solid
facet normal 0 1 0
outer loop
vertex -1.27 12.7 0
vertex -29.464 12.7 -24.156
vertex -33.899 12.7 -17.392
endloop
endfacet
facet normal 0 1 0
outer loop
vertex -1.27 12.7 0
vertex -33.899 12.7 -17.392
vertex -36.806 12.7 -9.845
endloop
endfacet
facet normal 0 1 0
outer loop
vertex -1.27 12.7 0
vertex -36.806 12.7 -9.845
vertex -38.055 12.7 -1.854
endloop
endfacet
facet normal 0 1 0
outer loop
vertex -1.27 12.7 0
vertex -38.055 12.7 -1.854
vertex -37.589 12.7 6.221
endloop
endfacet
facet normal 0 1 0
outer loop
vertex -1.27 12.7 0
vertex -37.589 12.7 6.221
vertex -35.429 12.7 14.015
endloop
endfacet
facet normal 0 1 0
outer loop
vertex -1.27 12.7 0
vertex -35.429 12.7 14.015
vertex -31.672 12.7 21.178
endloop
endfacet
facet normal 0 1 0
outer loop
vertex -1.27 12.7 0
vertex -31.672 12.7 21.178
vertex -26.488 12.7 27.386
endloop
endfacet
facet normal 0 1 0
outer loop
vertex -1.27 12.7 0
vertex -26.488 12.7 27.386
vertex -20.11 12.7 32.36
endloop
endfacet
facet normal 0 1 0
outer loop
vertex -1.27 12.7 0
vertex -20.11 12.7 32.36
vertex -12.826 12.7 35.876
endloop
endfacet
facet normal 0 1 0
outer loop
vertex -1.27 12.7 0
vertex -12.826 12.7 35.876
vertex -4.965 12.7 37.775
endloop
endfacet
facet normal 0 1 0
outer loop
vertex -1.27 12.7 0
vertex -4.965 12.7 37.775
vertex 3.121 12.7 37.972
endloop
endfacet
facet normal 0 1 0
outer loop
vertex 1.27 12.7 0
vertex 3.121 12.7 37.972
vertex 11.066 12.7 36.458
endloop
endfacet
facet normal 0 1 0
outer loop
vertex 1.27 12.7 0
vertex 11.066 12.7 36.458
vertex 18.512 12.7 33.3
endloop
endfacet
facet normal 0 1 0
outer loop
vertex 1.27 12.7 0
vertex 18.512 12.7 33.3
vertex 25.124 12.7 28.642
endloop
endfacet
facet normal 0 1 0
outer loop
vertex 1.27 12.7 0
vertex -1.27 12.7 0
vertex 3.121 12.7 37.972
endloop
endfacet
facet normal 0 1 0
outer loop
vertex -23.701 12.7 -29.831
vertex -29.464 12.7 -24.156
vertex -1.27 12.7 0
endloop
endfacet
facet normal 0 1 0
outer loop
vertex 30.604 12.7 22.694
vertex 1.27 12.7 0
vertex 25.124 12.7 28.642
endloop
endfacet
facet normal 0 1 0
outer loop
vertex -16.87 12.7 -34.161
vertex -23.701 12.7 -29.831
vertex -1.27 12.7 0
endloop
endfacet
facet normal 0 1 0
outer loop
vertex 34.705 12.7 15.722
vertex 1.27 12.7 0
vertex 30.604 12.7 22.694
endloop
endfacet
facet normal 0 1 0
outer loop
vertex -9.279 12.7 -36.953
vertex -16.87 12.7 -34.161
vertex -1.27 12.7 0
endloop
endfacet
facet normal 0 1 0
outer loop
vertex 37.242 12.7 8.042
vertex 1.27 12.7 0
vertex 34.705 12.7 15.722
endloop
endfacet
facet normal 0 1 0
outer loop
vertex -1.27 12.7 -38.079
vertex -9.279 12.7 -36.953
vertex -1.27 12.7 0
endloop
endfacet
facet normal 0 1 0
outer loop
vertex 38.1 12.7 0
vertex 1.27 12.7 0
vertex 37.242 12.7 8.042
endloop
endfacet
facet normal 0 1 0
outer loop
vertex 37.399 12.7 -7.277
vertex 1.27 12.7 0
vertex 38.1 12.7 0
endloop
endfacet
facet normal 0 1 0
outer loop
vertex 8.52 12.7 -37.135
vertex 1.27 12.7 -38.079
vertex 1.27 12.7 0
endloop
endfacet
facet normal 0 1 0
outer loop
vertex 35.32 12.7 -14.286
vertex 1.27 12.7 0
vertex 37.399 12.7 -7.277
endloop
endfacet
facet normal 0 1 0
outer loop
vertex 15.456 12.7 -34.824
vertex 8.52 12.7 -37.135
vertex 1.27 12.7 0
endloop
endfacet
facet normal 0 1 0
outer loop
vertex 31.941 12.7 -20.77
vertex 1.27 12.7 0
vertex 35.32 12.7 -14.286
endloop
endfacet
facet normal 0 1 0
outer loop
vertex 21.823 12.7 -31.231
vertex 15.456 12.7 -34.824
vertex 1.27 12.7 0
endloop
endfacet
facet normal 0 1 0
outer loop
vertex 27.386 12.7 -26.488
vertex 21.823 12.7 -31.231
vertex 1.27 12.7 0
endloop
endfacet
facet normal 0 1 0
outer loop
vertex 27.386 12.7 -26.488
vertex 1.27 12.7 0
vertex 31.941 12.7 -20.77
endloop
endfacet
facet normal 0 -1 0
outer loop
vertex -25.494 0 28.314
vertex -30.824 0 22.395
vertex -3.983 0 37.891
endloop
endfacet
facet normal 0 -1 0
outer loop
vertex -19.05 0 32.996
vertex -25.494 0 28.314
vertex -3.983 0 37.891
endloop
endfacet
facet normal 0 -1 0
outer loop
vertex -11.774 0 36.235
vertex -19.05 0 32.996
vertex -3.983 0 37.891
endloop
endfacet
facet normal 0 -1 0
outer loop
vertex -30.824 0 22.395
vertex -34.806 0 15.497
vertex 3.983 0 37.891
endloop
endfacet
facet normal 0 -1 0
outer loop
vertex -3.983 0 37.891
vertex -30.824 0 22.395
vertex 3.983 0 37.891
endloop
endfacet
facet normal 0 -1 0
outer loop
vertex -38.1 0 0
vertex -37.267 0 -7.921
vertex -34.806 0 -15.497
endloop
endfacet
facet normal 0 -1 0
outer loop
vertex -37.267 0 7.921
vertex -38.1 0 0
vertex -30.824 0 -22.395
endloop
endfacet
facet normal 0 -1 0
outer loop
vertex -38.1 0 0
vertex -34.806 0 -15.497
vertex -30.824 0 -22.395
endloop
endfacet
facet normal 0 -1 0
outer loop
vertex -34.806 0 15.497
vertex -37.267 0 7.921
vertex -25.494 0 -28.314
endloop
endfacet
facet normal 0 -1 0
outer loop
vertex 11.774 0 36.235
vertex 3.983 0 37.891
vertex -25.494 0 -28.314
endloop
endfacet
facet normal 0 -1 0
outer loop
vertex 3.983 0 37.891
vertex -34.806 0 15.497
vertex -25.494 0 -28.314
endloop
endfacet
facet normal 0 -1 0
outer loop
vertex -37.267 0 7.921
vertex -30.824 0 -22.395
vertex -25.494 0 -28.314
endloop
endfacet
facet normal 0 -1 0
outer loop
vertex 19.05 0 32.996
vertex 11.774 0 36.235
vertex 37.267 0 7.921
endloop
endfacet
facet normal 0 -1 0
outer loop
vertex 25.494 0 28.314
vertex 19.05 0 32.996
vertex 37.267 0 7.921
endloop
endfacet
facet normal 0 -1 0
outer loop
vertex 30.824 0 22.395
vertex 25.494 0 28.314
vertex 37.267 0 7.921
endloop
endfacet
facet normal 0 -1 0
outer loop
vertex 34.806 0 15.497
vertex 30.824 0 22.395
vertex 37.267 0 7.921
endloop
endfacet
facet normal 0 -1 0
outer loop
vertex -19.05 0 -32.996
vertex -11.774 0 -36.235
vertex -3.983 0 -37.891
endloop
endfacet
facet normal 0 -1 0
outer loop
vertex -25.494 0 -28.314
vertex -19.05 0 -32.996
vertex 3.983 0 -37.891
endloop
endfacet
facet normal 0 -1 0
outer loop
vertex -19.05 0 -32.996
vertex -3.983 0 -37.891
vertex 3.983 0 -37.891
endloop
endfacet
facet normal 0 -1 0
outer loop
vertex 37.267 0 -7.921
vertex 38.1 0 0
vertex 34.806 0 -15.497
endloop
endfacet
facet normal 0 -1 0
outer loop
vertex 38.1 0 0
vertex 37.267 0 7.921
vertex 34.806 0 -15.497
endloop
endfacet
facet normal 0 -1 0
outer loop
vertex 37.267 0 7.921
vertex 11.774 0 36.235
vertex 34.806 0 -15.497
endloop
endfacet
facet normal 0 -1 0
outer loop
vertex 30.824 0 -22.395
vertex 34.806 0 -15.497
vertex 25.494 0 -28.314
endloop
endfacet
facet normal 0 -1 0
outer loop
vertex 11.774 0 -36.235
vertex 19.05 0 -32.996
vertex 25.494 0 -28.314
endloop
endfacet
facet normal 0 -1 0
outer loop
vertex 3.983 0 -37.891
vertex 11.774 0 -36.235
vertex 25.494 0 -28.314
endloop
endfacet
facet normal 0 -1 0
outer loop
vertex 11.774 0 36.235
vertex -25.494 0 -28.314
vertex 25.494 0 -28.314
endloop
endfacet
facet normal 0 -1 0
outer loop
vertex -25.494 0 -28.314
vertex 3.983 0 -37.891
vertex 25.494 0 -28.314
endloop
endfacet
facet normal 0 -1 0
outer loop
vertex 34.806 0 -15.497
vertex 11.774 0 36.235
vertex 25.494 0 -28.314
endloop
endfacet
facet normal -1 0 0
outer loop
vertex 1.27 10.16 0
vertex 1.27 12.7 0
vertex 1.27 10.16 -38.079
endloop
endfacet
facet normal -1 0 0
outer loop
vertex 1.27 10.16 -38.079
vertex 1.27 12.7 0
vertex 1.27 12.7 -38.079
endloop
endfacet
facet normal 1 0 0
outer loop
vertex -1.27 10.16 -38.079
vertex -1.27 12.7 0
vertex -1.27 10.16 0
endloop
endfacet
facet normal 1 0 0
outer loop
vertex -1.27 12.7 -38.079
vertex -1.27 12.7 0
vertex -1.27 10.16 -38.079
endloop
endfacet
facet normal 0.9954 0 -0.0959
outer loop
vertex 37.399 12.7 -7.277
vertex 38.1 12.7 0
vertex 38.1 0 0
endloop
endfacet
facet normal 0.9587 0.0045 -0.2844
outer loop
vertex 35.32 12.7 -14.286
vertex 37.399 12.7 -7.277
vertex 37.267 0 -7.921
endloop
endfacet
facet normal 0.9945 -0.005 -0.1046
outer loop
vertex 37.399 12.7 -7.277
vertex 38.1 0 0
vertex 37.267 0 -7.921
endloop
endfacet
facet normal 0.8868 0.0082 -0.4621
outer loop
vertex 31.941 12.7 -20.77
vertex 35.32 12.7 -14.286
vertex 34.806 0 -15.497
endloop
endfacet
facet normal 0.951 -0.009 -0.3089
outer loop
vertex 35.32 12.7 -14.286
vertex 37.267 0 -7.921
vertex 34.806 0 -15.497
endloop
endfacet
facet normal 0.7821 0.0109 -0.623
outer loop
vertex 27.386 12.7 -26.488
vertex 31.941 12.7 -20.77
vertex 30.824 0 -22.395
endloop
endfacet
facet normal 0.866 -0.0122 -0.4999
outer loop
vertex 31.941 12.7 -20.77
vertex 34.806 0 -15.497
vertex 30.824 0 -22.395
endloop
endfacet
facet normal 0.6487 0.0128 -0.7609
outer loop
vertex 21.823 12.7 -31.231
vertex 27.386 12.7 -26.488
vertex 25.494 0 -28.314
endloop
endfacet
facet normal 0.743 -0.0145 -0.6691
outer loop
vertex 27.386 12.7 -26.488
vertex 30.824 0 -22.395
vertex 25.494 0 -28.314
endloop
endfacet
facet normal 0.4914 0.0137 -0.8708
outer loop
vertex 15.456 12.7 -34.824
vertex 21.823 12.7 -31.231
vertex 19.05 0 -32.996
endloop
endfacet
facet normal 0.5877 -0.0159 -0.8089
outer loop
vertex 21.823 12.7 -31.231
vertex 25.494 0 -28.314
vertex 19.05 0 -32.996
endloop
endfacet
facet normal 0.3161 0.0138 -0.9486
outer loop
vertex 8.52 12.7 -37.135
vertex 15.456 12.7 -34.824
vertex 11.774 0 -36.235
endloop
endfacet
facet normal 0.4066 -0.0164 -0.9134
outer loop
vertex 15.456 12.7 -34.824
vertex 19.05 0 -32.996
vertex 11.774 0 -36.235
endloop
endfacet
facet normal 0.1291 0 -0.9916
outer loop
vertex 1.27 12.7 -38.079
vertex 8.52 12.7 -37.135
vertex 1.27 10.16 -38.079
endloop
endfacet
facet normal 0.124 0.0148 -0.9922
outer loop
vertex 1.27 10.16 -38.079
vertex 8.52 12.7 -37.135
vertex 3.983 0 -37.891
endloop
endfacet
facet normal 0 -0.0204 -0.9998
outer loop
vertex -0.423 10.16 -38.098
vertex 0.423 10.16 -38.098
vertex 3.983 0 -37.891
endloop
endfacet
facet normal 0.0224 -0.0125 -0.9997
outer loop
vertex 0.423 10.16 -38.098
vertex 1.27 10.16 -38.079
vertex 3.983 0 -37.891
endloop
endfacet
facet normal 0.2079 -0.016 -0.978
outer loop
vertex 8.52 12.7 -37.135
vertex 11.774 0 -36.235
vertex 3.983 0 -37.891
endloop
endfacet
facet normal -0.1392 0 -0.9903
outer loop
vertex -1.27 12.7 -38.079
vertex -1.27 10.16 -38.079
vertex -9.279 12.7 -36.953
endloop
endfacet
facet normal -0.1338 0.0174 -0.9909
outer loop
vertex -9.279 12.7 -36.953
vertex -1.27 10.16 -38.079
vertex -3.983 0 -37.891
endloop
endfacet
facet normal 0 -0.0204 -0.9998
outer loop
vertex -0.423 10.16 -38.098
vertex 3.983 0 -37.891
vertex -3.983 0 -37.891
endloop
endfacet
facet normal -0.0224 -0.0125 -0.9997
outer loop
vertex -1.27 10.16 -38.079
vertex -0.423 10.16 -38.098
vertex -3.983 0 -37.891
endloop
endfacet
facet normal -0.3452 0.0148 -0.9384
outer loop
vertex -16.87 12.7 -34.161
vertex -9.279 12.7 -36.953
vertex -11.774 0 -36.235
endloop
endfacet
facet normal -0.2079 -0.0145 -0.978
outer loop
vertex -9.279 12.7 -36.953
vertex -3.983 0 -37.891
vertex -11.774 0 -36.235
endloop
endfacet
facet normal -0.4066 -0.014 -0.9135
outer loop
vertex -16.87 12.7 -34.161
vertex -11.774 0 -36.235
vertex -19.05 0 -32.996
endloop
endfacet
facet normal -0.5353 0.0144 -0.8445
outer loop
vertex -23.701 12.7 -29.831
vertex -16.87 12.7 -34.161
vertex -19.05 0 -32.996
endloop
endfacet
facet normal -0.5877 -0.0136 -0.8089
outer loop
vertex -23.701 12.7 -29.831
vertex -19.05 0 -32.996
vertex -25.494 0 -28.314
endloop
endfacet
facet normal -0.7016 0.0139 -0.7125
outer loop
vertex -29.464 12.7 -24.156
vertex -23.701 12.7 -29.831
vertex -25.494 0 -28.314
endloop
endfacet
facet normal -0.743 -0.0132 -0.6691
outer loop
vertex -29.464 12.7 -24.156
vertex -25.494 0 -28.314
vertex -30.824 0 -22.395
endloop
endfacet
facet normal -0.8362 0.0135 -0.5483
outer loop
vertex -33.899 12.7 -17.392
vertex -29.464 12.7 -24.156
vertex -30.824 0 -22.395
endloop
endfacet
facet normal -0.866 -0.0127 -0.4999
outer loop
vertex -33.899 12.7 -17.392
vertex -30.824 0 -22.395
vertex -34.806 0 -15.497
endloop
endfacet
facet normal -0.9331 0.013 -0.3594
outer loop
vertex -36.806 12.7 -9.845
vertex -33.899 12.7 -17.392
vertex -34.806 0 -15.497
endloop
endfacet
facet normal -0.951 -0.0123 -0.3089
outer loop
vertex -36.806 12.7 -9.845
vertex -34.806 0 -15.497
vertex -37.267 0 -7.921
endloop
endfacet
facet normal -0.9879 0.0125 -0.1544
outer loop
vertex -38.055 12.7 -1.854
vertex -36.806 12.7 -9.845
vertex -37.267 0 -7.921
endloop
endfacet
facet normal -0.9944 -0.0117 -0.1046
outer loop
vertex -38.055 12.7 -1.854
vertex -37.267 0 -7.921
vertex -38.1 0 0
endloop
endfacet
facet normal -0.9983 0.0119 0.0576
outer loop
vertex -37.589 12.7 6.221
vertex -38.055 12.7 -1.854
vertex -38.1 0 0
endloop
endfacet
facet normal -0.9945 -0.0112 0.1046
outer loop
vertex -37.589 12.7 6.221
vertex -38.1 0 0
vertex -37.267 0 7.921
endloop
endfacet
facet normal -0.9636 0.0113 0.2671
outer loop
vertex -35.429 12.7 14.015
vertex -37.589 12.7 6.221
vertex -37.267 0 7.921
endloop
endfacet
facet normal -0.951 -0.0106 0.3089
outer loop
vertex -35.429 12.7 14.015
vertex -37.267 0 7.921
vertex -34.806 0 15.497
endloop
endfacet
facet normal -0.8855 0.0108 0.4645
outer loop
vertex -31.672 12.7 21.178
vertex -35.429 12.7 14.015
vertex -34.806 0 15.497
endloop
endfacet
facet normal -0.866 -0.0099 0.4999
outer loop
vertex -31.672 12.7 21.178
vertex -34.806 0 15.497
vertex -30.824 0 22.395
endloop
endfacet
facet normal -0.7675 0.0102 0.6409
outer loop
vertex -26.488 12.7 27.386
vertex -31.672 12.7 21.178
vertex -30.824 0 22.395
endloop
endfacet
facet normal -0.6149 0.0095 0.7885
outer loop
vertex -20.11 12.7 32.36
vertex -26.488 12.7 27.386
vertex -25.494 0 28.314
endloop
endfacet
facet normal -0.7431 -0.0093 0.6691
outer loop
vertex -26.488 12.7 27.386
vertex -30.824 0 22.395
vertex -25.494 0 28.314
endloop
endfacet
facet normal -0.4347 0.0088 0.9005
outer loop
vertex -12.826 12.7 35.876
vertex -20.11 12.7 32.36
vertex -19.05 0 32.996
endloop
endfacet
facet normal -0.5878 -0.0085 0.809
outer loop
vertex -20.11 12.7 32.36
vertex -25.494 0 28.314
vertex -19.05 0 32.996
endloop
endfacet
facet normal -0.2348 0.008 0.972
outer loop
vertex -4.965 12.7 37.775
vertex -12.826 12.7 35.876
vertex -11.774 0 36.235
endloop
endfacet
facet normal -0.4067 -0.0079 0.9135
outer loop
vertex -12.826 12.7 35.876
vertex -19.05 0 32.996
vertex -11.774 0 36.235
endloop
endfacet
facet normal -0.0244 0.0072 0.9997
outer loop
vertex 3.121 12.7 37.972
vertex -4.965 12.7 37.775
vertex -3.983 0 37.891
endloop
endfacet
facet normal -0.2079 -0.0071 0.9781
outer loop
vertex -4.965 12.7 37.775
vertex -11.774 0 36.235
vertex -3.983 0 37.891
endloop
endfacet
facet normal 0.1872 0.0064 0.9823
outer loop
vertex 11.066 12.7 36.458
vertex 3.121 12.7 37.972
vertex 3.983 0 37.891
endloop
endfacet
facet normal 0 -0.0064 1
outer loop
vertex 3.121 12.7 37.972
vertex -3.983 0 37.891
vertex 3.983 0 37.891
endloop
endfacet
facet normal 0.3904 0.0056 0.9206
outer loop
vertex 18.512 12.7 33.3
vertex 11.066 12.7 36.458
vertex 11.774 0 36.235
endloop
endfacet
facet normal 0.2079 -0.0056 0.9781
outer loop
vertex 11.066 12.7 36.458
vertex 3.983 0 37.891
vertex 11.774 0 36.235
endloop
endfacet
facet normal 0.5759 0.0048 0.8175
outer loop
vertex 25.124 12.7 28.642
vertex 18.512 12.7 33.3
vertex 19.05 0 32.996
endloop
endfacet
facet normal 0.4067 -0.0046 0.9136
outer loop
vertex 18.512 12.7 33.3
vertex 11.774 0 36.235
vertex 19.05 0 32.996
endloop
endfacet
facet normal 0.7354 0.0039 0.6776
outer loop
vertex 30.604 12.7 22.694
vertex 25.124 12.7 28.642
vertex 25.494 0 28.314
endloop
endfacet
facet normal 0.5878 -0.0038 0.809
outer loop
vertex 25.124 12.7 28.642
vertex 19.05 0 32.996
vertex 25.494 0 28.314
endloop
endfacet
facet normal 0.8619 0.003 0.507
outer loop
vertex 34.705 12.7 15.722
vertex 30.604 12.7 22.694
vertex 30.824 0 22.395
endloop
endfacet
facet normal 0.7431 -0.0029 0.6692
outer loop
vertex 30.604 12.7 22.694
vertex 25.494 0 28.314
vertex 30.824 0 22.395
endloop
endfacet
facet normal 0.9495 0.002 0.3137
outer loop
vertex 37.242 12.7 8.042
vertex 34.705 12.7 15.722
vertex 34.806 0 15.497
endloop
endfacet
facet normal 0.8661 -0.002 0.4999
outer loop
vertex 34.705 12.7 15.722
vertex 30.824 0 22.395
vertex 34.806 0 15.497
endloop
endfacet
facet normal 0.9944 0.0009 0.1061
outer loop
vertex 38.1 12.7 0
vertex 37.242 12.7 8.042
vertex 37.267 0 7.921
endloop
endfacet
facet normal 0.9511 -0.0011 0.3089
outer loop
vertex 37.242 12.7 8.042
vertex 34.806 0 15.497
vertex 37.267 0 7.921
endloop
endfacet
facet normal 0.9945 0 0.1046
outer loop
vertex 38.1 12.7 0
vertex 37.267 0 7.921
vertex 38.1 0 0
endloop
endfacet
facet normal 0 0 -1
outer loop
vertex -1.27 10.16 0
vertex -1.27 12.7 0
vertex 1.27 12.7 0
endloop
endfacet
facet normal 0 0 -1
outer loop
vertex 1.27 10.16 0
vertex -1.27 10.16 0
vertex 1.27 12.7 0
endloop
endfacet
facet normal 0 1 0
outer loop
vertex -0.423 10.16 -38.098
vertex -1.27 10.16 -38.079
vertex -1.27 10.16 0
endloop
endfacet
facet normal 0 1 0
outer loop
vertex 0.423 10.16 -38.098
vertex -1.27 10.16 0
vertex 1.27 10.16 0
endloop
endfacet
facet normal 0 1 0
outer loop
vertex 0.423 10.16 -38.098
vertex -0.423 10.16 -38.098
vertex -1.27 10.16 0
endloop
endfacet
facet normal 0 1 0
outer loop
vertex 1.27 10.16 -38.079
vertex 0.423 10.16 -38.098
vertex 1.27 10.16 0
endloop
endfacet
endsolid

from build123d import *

# Parameters (mm, degrees)
SKETCH1_R               = 38.1
BOSS_EXTRUDE1_DEPTH     = 12.7
SKETCH2_W               = 2.54
SKETCH2_H               = 46.36082965
CUT_EXTRUDE_THIN2_DEPTH = 2.54


with BuildPart() as part:
    # Sketch1 → Boss-Extrude1 (new body)
    with BuildSketch(Plane(origin=(0, 0, 0), x_dir=(1, 0, 0), z_dir=(0, 1, 0))):
        Circle(SKETCH1_R)
    extrude(amount=BOSS_EXTRUDE1_DEPTH)

    # Sketch2 → Cut-Extrude-Thin2 (cut)
    with BuildSketch(Plane(origin=(0, 12.7, 0), x_dir=(1, 0, 0), z_dir=(0, 1, 0))):
        with Locations((0, 23.180414825)):
            Rectangle(SKETCH2_W, SKETCH2_H)
    extrude(amount=-CUT_EXTRUDE_THIN2_DEPTH, mode=Mode.SUBTRACT)


solid = part.part
